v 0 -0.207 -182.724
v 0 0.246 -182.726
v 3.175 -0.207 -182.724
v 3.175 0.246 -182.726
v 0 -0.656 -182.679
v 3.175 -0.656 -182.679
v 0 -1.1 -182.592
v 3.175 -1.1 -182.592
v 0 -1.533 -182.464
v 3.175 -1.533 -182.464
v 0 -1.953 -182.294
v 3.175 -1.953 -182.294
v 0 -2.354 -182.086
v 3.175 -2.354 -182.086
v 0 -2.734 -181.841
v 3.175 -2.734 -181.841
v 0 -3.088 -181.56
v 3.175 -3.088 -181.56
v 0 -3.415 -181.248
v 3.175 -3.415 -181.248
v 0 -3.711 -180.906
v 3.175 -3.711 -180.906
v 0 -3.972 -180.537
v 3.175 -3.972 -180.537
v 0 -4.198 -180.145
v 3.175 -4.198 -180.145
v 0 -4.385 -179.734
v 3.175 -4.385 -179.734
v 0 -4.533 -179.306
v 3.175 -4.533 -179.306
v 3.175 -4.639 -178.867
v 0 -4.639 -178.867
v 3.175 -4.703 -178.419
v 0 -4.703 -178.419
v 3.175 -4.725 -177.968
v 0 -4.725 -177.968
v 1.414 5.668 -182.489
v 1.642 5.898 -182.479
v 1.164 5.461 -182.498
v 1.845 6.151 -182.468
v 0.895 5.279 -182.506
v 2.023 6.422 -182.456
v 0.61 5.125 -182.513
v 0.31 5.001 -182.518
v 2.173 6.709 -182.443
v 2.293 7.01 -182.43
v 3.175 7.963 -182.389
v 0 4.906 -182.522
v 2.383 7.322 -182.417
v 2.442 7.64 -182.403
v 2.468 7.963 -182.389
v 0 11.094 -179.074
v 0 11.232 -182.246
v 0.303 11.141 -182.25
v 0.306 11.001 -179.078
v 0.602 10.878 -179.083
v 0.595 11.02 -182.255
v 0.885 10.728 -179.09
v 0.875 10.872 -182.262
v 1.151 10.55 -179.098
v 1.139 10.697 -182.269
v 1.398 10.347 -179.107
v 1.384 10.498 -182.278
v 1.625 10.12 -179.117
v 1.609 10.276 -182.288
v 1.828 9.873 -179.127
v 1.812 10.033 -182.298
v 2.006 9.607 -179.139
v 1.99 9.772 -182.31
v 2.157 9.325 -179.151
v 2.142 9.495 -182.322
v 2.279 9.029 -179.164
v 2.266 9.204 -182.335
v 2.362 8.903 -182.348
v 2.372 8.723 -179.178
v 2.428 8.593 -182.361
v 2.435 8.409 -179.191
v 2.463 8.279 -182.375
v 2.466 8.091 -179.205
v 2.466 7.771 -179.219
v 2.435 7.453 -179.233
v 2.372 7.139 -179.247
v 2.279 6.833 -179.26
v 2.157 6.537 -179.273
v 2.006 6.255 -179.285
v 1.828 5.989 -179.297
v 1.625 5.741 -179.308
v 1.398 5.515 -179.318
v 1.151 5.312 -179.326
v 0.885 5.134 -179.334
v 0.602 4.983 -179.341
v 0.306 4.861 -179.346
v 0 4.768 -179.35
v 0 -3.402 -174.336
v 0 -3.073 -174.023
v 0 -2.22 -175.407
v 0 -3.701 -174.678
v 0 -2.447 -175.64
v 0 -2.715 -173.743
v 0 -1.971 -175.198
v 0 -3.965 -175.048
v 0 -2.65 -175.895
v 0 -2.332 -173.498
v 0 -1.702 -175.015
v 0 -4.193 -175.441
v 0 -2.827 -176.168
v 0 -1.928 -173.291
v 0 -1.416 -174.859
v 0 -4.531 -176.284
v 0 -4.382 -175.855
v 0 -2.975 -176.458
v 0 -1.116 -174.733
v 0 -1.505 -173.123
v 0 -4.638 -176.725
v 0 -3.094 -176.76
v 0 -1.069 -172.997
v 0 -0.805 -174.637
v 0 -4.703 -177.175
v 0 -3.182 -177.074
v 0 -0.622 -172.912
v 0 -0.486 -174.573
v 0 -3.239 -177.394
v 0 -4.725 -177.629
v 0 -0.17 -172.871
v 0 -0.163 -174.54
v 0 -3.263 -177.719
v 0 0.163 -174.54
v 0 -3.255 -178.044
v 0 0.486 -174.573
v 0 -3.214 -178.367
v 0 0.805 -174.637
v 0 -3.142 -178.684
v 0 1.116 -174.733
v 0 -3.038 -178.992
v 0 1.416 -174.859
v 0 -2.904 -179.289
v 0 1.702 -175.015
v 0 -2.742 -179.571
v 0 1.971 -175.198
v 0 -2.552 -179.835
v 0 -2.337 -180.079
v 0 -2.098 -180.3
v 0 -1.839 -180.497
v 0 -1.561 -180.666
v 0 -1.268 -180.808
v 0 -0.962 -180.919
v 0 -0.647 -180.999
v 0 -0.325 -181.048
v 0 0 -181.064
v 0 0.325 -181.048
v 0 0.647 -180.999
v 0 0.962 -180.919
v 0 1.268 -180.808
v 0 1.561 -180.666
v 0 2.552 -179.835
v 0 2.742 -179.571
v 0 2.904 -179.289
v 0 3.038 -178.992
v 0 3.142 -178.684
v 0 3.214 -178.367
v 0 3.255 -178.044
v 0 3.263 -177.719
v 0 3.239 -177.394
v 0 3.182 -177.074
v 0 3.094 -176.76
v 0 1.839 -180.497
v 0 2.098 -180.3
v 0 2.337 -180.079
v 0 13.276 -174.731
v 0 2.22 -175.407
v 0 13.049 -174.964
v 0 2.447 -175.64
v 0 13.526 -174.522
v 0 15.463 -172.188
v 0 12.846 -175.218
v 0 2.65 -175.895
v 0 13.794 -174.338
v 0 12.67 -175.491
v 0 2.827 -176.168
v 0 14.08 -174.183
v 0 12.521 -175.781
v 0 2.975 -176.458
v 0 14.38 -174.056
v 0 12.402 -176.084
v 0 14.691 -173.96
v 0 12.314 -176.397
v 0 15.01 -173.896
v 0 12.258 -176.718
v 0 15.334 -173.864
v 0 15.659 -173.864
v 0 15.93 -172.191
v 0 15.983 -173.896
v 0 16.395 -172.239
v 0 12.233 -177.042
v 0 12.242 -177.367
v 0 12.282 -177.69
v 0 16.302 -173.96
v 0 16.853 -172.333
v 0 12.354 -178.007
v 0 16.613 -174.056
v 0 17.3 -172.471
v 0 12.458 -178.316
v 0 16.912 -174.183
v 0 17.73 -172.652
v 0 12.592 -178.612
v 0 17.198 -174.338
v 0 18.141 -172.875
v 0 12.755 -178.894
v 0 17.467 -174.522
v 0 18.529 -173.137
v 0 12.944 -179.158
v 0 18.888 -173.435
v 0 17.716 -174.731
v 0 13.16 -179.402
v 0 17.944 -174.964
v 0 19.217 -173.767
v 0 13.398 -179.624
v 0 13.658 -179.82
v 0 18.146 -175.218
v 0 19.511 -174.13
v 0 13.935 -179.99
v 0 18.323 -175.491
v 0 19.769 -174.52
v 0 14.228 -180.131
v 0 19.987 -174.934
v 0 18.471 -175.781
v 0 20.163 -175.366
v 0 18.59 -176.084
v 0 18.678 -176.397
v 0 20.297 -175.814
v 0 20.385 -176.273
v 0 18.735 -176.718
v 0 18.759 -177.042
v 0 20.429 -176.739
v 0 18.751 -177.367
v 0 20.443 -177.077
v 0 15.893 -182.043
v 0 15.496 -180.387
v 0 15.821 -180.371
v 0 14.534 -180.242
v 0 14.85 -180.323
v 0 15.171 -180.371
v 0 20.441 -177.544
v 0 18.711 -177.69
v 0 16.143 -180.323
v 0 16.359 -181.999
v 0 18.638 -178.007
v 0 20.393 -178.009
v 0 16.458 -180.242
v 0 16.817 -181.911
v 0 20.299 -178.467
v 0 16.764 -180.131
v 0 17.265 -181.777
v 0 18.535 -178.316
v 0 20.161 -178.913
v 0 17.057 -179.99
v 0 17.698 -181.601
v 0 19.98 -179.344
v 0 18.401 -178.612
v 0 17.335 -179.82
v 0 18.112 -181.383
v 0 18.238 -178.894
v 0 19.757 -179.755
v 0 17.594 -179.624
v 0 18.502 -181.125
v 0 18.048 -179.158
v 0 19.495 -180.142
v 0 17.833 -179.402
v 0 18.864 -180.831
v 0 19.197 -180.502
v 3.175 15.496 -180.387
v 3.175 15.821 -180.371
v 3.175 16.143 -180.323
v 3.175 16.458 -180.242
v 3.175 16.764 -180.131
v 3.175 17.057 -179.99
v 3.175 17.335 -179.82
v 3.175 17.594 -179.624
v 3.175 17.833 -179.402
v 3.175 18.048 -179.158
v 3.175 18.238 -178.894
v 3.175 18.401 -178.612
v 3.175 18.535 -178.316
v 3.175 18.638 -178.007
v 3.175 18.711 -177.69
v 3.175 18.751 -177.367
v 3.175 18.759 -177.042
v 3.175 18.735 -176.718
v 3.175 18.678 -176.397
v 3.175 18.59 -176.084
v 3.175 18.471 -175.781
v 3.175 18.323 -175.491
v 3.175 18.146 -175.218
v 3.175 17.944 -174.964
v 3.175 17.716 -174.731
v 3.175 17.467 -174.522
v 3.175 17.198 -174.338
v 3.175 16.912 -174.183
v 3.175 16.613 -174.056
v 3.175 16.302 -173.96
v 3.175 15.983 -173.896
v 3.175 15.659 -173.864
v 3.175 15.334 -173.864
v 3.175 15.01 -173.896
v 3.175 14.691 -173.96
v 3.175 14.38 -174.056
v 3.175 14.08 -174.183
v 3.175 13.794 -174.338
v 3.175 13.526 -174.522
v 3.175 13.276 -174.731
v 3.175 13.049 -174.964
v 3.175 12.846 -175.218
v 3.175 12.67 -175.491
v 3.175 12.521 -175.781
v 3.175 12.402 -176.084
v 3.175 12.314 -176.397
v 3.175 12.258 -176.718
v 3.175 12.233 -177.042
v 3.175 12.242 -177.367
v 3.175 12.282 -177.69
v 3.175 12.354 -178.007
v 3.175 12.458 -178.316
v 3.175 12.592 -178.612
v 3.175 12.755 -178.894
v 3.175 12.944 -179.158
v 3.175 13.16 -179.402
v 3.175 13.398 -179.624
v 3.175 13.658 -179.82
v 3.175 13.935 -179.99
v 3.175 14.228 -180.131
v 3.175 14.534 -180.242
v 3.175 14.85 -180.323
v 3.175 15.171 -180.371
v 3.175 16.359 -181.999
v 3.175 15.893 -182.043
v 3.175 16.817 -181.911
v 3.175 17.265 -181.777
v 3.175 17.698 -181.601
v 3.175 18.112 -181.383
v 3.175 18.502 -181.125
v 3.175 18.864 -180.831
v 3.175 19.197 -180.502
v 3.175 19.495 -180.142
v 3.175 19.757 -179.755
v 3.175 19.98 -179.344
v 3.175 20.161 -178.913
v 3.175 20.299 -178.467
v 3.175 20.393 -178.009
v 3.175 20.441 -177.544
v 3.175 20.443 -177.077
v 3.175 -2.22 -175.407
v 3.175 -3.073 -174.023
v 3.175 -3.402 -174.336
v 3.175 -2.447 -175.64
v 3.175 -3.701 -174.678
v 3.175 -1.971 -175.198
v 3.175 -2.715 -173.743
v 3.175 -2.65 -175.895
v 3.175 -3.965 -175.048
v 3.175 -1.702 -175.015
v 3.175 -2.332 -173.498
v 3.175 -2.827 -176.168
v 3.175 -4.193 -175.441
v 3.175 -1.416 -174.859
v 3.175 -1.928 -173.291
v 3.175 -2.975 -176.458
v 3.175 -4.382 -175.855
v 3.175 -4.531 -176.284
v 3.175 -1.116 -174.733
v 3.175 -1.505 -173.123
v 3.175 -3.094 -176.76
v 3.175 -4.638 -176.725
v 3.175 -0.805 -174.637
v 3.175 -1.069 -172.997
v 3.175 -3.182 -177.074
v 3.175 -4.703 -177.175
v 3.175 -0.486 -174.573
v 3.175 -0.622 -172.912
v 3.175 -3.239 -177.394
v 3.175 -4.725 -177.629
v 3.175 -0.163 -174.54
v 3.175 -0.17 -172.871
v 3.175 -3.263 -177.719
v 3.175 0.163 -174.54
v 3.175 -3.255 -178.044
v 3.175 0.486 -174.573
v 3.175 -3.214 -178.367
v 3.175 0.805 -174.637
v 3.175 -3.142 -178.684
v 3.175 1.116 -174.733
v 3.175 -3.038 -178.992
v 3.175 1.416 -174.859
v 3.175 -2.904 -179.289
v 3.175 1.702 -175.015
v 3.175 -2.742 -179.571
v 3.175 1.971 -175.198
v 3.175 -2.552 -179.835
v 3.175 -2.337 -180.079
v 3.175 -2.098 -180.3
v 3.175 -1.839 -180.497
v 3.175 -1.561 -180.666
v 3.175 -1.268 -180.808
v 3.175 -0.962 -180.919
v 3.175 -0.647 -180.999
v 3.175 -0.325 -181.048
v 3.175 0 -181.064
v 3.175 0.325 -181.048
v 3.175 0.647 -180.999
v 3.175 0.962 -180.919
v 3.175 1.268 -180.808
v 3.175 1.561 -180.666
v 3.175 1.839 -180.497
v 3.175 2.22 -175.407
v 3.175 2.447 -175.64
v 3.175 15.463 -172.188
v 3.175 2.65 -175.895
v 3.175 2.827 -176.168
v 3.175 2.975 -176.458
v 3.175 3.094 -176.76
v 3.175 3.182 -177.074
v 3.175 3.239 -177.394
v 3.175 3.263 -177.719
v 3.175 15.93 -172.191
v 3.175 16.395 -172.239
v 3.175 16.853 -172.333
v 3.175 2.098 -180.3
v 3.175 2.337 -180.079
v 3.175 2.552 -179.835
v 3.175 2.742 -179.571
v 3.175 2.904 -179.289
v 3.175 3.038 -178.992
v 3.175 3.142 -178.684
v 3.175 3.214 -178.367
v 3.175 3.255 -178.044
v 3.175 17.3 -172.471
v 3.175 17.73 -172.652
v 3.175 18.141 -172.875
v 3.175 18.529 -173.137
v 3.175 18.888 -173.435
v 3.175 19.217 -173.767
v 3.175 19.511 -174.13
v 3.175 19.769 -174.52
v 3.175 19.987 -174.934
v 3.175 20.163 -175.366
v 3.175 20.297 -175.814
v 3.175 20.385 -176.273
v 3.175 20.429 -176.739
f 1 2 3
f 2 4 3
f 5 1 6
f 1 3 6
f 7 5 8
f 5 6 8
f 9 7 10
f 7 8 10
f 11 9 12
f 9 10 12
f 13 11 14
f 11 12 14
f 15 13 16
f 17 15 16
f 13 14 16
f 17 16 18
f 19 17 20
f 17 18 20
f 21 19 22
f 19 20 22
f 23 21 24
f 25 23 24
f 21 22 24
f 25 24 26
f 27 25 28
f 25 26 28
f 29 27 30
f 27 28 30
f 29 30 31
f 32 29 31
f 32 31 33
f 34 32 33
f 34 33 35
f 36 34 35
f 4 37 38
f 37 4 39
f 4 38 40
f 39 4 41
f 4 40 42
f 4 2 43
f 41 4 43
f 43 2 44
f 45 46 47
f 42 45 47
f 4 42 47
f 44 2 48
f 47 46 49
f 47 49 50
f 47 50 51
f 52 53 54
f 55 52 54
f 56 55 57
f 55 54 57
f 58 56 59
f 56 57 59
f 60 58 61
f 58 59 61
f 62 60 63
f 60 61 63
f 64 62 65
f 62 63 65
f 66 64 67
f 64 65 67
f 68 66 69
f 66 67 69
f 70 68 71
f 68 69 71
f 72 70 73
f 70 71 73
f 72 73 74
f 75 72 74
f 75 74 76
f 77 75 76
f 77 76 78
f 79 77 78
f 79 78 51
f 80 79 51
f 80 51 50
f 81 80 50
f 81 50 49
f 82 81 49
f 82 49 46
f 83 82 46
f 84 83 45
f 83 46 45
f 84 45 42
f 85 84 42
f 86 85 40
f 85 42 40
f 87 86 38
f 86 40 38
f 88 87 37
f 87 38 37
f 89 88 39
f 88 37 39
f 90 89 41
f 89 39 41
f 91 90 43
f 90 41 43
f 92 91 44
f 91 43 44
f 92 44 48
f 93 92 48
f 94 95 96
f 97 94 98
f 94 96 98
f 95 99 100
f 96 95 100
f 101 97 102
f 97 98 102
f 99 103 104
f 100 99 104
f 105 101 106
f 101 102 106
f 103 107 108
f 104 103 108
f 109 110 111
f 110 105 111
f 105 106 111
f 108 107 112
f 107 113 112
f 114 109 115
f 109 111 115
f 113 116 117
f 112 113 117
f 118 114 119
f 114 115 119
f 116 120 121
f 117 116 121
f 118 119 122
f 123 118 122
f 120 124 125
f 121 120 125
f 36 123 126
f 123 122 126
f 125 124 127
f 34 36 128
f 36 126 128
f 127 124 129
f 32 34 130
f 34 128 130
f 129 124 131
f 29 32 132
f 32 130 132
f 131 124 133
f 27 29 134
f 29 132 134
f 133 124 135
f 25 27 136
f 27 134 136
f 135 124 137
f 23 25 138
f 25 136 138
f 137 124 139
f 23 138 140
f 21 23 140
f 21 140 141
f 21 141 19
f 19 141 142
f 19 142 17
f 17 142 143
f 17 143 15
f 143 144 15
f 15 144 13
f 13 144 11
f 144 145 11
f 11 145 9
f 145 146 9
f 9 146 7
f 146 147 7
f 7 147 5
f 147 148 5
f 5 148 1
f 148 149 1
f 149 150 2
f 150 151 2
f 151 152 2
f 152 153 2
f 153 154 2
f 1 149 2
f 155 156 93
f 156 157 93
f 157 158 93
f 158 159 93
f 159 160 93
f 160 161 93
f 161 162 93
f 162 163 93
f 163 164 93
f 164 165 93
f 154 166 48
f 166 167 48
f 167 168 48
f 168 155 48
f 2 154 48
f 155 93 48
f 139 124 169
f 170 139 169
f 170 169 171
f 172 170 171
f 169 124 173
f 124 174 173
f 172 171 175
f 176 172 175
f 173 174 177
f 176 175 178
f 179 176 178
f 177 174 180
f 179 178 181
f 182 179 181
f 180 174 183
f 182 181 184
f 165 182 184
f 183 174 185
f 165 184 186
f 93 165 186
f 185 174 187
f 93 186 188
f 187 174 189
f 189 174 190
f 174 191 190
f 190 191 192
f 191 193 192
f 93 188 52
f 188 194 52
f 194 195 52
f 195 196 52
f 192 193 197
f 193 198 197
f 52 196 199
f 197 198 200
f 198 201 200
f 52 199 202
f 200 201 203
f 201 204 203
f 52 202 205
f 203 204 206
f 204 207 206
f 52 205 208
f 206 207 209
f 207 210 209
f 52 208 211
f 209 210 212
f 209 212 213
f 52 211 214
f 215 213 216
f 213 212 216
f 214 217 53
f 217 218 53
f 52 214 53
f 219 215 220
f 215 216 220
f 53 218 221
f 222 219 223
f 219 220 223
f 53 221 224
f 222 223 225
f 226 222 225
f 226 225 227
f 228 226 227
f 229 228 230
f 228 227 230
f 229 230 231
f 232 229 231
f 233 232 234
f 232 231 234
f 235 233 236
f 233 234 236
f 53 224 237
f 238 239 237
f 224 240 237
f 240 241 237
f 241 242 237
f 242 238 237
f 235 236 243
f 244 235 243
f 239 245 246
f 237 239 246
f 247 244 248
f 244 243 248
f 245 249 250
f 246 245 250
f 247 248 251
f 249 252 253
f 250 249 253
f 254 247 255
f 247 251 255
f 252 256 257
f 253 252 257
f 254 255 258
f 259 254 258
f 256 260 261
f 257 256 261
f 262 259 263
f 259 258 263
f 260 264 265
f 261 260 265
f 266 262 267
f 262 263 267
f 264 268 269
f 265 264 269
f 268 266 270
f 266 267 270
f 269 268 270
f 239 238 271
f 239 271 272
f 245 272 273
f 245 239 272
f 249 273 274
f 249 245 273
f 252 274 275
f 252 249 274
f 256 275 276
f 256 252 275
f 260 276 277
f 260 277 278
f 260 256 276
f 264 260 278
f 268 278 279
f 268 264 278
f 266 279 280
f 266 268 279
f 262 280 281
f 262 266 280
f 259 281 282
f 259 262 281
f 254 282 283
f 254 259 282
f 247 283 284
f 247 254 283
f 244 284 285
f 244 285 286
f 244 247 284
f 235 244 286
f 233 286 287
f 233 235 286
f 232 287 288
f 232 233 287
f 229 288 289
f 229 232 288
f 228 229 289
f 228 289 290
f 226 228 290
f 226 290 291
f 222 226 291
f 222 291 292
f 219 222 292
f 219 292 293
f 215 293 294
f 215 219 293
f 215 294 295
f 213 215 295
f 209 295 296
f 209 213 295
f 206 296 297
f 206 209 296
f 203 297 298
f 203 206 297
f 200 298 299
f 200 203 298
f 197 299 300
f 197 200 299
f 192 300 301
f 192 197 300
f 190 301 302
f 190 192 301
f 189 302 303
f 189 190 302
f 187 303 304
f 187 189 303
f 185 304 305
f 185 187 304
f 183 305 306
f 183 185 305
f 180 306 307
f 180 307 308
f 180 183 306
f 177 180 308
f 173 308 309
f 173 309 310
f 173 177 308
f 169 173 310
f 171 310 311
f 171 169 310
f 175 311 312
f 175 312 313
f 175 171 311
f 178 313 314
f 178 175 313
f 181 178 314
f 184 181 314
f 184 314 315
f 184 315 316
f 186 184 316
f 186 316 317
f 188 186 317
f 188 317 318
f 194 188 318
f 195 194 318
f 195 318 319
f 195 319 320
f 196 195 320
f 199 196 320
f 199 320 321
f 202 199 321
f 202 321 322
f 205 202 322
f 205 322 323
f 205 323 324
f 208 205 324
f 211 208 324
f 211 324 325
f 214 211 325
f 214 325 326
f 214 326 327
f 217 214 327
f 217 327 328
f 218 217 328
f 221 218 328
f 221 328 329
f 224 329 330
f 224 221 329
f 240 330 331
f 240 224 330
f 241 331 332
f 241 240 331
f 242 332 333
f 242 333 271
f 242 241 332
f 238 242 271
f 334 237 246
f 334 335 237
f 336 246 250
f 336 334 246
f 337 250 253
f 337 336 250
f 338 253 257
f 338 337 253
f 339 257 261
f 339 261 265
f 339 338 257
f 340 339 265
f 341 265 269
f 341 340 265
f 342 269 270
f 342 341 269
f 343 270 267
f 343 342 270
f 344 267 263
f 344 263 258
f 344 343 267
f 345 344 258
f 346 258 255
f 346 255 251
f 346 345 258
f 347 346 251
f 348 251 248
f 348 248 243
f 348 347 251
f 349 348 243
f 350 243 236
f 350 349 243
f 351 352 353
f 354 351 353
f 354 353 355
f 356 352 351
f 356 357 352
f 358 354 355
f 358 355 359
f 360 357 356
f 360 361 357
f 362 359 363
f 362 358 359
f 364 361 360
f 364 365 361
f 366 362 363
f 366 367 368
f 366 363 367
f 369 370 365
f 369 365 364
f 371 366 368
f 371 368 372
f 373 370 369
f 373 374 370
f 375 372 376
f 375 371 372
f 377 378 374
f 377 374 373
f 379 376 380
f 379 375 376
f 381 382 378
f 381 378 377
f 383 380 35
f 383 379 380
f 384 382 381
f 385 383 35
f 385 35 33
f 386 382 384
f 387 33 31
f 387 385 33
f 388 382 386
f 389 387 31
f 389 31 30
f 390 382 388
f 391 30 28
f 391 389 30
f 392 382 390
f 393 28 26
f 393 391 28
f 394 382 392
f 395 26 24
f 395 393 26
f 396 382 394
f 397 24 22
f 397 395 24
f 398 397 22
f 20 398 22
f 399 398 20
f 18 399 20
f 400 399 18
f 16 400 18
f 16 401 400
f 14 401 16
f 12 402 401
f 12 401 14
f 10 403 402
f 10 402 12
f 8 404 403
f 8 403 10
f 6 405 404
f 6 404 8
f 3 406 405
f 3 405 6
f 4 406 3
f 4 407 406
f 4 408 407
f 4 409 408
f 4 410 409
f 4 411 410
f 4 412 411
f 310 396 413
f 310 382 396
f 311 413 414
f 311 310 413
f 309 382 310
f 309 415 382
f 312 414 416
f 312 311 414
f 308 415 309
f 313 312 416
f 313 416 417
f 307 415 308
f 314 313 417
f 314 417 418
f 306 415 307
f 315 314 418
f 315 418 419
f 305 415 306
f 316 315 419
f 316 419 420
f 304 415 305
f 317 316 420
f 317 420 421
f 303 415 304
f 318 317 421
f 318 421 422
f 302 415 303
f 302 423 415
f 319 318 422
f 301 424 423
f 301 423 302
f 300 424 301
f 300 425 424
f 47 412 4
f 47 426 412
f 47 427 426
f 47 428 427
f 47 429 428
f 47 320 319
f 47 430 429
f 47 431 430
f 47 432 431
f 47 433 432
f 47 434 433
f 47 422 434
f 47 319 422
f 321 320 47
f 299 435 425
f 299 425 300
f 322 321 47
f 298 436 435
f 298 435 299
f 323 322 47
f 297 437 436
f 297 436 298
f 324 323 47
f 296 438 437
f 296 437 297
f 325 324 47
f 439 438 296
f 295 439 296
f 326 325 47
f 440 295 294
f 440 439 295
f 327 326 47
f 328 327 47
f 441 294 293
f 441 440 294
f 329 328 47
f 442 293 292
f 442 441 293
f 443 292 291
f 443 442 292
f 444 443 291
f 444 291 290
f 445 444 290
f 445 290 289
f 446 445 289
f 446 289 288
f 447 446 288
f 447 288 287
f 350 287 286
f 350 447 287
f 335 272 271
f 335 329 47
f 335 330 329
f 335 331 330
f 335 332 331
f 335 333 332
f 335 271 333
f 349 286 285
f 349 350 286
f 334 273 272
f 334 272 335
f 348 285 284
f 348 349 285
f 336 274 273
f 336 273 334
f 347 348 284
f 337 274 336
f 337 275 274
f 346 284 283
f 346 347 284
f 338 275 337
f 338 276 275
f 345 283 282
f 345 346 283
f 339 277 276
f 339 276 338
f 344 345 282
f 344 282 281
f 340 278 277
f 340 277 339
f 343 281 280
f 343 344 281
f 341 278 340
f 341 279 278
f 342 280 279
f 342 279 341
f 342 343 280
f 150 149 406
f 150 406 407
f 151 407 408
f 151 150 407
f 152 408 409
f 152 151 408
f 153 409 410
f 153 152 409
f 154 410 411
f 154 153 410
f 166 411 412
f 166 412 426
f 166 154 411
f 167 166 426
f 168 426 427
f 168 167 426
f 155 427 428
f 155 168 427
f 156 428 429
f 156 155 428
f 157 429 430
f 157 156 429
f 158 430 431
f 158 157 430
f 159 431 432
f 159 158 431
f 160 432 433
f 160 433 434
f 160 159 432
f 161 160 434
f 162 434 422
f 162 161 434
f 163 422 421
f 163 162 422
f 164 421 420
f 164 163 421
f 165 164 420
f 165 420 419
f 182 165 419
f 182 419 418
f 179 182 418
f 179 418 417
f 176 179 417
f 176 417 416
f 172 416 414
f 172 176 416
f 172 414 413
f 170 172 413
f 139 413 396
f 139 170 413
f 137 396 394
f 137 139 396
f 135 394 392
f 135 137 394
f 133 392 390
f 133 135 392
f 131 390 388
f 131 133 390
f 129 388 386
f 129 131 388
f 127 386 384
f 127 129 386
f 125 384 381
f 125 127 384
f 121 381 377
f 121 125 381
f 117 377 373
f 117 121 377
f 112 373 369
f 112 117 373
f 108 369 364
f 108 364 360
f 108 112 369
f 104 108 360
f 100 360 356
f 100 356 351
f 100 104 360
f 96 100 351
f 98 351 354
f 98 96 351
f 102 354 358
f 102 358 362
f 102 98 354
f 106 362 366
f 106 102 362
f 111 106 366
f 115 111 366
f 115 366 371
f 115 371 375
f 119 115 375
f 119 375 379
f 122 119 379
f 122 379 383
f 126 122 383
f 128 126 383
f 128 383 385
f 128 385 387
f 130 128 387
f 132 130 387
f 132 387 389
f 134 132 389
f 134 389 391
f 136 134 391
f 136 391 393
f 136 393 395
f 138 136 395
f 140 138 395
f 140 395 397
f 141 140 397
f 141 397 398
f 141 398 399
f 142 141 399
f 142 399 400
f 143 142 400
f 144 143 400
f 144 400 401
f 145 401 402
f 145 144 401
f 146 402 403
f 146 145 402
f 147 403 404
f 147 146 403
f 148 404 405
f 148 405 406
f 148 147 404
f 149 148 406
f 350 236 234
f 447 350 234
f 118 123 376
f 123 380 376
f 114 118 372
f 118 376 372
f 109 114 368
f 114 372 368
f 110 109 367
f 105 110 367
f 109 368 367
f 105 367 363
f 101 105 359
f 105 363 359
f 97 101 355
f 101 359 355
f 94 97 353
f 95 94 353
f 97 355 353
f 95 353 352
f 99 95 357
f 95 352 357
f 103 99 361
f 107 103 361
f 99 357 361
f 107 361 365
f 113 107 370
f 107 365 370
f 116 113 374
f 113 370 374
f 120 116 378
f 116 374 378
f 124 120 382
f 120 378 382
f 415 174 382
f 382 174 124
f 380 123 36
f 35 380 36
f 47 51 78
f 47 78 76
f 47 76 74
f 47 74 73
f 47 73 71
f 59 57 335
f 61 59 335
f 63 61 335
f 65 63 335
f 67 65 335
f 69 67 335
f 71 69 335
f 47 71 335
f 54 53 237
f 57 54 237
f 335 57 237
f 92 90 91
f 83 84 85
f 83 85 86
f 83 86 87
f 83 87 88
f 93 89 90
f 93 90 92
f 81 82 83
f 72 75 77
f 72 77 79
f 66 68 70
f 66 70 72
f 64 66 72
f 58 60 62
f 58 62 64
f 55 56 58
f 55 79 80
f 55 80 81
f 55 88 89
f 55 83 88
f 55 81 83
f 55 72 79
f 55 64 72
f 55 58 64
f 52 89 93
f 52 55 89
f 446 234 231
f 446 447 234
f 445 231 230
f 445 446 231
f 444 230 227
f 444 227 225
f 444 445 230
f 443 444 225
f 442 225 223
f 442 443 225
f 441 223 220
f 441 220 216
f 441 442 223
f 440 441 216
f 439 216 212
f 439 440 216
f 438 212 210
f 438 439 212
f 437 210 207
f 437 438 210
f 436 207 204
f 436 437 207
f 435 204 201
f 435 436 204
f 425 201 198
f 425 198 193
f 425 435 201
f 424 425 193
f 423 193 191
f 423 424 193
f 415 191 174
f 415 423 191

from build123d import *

# Parameters (mm, degrees)
SKETCH1_R           = 3.2639
BOSS_EXTRUDE1_DEPTH = 3.175
FILLET2_R           = 4.7625
SKETCH3_R           = 3.2639
CUT_EXTRUDE1_DEPTH  = 3.175


with BuildPart() as part:
    # Sketch1 → Boss-Extrude1 (new body)
    with BuildSketch(Plane(origin=(0, 0, 0), x_dir=(0, 0, -1), z_dir=(1, 0, 0))):
        Polygon((182.388740953, 7.963264406), (181.834774733, 20.65117682), (171.980710149, 20.220939069), (173.069858002, -4.724648008), (182.942707172, -4.724648008), align=None)
        with Locations((177.123417321, 15.496291061)):
            Circle(SKETCH1_R, mode=Mode.SUBTRACT)
        with Locations((177.8, 0)):
            Circle(SKETCH1_R, mode=Mode.SUBTRACT)
    extrude(amount=BOSS_EXTRUDE1_DEPTH)

    # Fillet2
    fillet2_edges = [part.edges().sort_by_distance(p)[0] for p in [
        (1.5875, -4.724648008, -182.942707172),
        (1.5875, -4.724648008, -173.069858002),
        (1.5875, 20.220939069, -171.980710149),
        (1.5875, 20.65117682, -181.834774733),
    ]]
    fillet(fillet2_edges, radius=FILLET2_R)

    # Sketch3 → Cut-Extrude1 (cut)
    with BuildSketch(Plane(origin=(0, 7.963264406, -182.388740953), x_dir=(-1, 0, 0), z_dir=(0, 0.04361938736533578, -0.9990482215818579))):
        with Locations((0.79375, 0.106236202)):
            Circle(SKETCH3_R)
    extrude(amount=-CUT_EXTRUDE1_DEPTH, mode=Mode.SUBTRACT)


solid = part.part
